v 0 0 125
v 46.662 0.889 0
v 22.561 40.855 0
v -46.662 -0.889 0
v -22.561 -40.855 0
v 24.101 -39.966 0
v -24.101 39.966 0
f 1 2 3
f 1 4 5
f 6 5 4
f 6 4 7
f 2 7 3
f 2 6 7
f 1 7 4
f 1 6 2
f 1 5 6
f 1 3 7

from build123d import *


with BuildPart() as f3:
    # F0 (on Top) → F3 section 0
    with BuildSketch(Plane.XY, mode=Mode.PRIVATE) as f3_s0:
        Polygon((-22.561089, -40.85453), (24.100516, -39.965741), (46.661605, 0.888788), (22.561089, 40.85453), (-24.100516, 39.965741), (-46.661605, -0.888788), align=None)
    loft([f3_s0.sketch, Vertex(0, 0, 125)])


solid = f3.part
